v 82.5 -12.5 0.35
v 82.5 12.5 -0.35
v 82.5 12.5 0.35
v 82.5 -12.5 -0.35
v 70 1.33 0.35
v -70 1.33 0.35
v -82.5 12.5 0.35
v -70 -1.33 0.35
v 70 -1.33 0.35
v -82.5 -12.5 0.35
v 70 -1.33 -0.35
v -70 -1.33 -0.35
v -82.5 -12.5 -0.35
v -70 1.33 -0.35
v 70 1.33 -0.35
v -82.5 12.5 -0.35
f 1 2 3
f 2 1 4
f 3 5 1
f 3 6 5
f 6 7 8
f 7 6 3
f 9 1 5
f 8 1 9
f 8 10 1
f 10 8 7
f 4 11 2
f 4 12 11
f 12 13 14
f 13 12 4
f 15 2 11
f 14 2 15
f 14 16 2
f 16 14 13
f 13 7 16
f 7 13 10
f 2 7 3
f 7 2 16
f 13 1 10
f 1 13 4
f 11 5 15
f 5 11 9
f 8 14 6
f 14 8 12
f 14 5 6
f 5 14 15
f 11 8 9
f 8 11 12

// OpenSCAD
difference() {
  cube([165,25,0.7],center=true);
  cube([140,2.66,1],center=true);
}
